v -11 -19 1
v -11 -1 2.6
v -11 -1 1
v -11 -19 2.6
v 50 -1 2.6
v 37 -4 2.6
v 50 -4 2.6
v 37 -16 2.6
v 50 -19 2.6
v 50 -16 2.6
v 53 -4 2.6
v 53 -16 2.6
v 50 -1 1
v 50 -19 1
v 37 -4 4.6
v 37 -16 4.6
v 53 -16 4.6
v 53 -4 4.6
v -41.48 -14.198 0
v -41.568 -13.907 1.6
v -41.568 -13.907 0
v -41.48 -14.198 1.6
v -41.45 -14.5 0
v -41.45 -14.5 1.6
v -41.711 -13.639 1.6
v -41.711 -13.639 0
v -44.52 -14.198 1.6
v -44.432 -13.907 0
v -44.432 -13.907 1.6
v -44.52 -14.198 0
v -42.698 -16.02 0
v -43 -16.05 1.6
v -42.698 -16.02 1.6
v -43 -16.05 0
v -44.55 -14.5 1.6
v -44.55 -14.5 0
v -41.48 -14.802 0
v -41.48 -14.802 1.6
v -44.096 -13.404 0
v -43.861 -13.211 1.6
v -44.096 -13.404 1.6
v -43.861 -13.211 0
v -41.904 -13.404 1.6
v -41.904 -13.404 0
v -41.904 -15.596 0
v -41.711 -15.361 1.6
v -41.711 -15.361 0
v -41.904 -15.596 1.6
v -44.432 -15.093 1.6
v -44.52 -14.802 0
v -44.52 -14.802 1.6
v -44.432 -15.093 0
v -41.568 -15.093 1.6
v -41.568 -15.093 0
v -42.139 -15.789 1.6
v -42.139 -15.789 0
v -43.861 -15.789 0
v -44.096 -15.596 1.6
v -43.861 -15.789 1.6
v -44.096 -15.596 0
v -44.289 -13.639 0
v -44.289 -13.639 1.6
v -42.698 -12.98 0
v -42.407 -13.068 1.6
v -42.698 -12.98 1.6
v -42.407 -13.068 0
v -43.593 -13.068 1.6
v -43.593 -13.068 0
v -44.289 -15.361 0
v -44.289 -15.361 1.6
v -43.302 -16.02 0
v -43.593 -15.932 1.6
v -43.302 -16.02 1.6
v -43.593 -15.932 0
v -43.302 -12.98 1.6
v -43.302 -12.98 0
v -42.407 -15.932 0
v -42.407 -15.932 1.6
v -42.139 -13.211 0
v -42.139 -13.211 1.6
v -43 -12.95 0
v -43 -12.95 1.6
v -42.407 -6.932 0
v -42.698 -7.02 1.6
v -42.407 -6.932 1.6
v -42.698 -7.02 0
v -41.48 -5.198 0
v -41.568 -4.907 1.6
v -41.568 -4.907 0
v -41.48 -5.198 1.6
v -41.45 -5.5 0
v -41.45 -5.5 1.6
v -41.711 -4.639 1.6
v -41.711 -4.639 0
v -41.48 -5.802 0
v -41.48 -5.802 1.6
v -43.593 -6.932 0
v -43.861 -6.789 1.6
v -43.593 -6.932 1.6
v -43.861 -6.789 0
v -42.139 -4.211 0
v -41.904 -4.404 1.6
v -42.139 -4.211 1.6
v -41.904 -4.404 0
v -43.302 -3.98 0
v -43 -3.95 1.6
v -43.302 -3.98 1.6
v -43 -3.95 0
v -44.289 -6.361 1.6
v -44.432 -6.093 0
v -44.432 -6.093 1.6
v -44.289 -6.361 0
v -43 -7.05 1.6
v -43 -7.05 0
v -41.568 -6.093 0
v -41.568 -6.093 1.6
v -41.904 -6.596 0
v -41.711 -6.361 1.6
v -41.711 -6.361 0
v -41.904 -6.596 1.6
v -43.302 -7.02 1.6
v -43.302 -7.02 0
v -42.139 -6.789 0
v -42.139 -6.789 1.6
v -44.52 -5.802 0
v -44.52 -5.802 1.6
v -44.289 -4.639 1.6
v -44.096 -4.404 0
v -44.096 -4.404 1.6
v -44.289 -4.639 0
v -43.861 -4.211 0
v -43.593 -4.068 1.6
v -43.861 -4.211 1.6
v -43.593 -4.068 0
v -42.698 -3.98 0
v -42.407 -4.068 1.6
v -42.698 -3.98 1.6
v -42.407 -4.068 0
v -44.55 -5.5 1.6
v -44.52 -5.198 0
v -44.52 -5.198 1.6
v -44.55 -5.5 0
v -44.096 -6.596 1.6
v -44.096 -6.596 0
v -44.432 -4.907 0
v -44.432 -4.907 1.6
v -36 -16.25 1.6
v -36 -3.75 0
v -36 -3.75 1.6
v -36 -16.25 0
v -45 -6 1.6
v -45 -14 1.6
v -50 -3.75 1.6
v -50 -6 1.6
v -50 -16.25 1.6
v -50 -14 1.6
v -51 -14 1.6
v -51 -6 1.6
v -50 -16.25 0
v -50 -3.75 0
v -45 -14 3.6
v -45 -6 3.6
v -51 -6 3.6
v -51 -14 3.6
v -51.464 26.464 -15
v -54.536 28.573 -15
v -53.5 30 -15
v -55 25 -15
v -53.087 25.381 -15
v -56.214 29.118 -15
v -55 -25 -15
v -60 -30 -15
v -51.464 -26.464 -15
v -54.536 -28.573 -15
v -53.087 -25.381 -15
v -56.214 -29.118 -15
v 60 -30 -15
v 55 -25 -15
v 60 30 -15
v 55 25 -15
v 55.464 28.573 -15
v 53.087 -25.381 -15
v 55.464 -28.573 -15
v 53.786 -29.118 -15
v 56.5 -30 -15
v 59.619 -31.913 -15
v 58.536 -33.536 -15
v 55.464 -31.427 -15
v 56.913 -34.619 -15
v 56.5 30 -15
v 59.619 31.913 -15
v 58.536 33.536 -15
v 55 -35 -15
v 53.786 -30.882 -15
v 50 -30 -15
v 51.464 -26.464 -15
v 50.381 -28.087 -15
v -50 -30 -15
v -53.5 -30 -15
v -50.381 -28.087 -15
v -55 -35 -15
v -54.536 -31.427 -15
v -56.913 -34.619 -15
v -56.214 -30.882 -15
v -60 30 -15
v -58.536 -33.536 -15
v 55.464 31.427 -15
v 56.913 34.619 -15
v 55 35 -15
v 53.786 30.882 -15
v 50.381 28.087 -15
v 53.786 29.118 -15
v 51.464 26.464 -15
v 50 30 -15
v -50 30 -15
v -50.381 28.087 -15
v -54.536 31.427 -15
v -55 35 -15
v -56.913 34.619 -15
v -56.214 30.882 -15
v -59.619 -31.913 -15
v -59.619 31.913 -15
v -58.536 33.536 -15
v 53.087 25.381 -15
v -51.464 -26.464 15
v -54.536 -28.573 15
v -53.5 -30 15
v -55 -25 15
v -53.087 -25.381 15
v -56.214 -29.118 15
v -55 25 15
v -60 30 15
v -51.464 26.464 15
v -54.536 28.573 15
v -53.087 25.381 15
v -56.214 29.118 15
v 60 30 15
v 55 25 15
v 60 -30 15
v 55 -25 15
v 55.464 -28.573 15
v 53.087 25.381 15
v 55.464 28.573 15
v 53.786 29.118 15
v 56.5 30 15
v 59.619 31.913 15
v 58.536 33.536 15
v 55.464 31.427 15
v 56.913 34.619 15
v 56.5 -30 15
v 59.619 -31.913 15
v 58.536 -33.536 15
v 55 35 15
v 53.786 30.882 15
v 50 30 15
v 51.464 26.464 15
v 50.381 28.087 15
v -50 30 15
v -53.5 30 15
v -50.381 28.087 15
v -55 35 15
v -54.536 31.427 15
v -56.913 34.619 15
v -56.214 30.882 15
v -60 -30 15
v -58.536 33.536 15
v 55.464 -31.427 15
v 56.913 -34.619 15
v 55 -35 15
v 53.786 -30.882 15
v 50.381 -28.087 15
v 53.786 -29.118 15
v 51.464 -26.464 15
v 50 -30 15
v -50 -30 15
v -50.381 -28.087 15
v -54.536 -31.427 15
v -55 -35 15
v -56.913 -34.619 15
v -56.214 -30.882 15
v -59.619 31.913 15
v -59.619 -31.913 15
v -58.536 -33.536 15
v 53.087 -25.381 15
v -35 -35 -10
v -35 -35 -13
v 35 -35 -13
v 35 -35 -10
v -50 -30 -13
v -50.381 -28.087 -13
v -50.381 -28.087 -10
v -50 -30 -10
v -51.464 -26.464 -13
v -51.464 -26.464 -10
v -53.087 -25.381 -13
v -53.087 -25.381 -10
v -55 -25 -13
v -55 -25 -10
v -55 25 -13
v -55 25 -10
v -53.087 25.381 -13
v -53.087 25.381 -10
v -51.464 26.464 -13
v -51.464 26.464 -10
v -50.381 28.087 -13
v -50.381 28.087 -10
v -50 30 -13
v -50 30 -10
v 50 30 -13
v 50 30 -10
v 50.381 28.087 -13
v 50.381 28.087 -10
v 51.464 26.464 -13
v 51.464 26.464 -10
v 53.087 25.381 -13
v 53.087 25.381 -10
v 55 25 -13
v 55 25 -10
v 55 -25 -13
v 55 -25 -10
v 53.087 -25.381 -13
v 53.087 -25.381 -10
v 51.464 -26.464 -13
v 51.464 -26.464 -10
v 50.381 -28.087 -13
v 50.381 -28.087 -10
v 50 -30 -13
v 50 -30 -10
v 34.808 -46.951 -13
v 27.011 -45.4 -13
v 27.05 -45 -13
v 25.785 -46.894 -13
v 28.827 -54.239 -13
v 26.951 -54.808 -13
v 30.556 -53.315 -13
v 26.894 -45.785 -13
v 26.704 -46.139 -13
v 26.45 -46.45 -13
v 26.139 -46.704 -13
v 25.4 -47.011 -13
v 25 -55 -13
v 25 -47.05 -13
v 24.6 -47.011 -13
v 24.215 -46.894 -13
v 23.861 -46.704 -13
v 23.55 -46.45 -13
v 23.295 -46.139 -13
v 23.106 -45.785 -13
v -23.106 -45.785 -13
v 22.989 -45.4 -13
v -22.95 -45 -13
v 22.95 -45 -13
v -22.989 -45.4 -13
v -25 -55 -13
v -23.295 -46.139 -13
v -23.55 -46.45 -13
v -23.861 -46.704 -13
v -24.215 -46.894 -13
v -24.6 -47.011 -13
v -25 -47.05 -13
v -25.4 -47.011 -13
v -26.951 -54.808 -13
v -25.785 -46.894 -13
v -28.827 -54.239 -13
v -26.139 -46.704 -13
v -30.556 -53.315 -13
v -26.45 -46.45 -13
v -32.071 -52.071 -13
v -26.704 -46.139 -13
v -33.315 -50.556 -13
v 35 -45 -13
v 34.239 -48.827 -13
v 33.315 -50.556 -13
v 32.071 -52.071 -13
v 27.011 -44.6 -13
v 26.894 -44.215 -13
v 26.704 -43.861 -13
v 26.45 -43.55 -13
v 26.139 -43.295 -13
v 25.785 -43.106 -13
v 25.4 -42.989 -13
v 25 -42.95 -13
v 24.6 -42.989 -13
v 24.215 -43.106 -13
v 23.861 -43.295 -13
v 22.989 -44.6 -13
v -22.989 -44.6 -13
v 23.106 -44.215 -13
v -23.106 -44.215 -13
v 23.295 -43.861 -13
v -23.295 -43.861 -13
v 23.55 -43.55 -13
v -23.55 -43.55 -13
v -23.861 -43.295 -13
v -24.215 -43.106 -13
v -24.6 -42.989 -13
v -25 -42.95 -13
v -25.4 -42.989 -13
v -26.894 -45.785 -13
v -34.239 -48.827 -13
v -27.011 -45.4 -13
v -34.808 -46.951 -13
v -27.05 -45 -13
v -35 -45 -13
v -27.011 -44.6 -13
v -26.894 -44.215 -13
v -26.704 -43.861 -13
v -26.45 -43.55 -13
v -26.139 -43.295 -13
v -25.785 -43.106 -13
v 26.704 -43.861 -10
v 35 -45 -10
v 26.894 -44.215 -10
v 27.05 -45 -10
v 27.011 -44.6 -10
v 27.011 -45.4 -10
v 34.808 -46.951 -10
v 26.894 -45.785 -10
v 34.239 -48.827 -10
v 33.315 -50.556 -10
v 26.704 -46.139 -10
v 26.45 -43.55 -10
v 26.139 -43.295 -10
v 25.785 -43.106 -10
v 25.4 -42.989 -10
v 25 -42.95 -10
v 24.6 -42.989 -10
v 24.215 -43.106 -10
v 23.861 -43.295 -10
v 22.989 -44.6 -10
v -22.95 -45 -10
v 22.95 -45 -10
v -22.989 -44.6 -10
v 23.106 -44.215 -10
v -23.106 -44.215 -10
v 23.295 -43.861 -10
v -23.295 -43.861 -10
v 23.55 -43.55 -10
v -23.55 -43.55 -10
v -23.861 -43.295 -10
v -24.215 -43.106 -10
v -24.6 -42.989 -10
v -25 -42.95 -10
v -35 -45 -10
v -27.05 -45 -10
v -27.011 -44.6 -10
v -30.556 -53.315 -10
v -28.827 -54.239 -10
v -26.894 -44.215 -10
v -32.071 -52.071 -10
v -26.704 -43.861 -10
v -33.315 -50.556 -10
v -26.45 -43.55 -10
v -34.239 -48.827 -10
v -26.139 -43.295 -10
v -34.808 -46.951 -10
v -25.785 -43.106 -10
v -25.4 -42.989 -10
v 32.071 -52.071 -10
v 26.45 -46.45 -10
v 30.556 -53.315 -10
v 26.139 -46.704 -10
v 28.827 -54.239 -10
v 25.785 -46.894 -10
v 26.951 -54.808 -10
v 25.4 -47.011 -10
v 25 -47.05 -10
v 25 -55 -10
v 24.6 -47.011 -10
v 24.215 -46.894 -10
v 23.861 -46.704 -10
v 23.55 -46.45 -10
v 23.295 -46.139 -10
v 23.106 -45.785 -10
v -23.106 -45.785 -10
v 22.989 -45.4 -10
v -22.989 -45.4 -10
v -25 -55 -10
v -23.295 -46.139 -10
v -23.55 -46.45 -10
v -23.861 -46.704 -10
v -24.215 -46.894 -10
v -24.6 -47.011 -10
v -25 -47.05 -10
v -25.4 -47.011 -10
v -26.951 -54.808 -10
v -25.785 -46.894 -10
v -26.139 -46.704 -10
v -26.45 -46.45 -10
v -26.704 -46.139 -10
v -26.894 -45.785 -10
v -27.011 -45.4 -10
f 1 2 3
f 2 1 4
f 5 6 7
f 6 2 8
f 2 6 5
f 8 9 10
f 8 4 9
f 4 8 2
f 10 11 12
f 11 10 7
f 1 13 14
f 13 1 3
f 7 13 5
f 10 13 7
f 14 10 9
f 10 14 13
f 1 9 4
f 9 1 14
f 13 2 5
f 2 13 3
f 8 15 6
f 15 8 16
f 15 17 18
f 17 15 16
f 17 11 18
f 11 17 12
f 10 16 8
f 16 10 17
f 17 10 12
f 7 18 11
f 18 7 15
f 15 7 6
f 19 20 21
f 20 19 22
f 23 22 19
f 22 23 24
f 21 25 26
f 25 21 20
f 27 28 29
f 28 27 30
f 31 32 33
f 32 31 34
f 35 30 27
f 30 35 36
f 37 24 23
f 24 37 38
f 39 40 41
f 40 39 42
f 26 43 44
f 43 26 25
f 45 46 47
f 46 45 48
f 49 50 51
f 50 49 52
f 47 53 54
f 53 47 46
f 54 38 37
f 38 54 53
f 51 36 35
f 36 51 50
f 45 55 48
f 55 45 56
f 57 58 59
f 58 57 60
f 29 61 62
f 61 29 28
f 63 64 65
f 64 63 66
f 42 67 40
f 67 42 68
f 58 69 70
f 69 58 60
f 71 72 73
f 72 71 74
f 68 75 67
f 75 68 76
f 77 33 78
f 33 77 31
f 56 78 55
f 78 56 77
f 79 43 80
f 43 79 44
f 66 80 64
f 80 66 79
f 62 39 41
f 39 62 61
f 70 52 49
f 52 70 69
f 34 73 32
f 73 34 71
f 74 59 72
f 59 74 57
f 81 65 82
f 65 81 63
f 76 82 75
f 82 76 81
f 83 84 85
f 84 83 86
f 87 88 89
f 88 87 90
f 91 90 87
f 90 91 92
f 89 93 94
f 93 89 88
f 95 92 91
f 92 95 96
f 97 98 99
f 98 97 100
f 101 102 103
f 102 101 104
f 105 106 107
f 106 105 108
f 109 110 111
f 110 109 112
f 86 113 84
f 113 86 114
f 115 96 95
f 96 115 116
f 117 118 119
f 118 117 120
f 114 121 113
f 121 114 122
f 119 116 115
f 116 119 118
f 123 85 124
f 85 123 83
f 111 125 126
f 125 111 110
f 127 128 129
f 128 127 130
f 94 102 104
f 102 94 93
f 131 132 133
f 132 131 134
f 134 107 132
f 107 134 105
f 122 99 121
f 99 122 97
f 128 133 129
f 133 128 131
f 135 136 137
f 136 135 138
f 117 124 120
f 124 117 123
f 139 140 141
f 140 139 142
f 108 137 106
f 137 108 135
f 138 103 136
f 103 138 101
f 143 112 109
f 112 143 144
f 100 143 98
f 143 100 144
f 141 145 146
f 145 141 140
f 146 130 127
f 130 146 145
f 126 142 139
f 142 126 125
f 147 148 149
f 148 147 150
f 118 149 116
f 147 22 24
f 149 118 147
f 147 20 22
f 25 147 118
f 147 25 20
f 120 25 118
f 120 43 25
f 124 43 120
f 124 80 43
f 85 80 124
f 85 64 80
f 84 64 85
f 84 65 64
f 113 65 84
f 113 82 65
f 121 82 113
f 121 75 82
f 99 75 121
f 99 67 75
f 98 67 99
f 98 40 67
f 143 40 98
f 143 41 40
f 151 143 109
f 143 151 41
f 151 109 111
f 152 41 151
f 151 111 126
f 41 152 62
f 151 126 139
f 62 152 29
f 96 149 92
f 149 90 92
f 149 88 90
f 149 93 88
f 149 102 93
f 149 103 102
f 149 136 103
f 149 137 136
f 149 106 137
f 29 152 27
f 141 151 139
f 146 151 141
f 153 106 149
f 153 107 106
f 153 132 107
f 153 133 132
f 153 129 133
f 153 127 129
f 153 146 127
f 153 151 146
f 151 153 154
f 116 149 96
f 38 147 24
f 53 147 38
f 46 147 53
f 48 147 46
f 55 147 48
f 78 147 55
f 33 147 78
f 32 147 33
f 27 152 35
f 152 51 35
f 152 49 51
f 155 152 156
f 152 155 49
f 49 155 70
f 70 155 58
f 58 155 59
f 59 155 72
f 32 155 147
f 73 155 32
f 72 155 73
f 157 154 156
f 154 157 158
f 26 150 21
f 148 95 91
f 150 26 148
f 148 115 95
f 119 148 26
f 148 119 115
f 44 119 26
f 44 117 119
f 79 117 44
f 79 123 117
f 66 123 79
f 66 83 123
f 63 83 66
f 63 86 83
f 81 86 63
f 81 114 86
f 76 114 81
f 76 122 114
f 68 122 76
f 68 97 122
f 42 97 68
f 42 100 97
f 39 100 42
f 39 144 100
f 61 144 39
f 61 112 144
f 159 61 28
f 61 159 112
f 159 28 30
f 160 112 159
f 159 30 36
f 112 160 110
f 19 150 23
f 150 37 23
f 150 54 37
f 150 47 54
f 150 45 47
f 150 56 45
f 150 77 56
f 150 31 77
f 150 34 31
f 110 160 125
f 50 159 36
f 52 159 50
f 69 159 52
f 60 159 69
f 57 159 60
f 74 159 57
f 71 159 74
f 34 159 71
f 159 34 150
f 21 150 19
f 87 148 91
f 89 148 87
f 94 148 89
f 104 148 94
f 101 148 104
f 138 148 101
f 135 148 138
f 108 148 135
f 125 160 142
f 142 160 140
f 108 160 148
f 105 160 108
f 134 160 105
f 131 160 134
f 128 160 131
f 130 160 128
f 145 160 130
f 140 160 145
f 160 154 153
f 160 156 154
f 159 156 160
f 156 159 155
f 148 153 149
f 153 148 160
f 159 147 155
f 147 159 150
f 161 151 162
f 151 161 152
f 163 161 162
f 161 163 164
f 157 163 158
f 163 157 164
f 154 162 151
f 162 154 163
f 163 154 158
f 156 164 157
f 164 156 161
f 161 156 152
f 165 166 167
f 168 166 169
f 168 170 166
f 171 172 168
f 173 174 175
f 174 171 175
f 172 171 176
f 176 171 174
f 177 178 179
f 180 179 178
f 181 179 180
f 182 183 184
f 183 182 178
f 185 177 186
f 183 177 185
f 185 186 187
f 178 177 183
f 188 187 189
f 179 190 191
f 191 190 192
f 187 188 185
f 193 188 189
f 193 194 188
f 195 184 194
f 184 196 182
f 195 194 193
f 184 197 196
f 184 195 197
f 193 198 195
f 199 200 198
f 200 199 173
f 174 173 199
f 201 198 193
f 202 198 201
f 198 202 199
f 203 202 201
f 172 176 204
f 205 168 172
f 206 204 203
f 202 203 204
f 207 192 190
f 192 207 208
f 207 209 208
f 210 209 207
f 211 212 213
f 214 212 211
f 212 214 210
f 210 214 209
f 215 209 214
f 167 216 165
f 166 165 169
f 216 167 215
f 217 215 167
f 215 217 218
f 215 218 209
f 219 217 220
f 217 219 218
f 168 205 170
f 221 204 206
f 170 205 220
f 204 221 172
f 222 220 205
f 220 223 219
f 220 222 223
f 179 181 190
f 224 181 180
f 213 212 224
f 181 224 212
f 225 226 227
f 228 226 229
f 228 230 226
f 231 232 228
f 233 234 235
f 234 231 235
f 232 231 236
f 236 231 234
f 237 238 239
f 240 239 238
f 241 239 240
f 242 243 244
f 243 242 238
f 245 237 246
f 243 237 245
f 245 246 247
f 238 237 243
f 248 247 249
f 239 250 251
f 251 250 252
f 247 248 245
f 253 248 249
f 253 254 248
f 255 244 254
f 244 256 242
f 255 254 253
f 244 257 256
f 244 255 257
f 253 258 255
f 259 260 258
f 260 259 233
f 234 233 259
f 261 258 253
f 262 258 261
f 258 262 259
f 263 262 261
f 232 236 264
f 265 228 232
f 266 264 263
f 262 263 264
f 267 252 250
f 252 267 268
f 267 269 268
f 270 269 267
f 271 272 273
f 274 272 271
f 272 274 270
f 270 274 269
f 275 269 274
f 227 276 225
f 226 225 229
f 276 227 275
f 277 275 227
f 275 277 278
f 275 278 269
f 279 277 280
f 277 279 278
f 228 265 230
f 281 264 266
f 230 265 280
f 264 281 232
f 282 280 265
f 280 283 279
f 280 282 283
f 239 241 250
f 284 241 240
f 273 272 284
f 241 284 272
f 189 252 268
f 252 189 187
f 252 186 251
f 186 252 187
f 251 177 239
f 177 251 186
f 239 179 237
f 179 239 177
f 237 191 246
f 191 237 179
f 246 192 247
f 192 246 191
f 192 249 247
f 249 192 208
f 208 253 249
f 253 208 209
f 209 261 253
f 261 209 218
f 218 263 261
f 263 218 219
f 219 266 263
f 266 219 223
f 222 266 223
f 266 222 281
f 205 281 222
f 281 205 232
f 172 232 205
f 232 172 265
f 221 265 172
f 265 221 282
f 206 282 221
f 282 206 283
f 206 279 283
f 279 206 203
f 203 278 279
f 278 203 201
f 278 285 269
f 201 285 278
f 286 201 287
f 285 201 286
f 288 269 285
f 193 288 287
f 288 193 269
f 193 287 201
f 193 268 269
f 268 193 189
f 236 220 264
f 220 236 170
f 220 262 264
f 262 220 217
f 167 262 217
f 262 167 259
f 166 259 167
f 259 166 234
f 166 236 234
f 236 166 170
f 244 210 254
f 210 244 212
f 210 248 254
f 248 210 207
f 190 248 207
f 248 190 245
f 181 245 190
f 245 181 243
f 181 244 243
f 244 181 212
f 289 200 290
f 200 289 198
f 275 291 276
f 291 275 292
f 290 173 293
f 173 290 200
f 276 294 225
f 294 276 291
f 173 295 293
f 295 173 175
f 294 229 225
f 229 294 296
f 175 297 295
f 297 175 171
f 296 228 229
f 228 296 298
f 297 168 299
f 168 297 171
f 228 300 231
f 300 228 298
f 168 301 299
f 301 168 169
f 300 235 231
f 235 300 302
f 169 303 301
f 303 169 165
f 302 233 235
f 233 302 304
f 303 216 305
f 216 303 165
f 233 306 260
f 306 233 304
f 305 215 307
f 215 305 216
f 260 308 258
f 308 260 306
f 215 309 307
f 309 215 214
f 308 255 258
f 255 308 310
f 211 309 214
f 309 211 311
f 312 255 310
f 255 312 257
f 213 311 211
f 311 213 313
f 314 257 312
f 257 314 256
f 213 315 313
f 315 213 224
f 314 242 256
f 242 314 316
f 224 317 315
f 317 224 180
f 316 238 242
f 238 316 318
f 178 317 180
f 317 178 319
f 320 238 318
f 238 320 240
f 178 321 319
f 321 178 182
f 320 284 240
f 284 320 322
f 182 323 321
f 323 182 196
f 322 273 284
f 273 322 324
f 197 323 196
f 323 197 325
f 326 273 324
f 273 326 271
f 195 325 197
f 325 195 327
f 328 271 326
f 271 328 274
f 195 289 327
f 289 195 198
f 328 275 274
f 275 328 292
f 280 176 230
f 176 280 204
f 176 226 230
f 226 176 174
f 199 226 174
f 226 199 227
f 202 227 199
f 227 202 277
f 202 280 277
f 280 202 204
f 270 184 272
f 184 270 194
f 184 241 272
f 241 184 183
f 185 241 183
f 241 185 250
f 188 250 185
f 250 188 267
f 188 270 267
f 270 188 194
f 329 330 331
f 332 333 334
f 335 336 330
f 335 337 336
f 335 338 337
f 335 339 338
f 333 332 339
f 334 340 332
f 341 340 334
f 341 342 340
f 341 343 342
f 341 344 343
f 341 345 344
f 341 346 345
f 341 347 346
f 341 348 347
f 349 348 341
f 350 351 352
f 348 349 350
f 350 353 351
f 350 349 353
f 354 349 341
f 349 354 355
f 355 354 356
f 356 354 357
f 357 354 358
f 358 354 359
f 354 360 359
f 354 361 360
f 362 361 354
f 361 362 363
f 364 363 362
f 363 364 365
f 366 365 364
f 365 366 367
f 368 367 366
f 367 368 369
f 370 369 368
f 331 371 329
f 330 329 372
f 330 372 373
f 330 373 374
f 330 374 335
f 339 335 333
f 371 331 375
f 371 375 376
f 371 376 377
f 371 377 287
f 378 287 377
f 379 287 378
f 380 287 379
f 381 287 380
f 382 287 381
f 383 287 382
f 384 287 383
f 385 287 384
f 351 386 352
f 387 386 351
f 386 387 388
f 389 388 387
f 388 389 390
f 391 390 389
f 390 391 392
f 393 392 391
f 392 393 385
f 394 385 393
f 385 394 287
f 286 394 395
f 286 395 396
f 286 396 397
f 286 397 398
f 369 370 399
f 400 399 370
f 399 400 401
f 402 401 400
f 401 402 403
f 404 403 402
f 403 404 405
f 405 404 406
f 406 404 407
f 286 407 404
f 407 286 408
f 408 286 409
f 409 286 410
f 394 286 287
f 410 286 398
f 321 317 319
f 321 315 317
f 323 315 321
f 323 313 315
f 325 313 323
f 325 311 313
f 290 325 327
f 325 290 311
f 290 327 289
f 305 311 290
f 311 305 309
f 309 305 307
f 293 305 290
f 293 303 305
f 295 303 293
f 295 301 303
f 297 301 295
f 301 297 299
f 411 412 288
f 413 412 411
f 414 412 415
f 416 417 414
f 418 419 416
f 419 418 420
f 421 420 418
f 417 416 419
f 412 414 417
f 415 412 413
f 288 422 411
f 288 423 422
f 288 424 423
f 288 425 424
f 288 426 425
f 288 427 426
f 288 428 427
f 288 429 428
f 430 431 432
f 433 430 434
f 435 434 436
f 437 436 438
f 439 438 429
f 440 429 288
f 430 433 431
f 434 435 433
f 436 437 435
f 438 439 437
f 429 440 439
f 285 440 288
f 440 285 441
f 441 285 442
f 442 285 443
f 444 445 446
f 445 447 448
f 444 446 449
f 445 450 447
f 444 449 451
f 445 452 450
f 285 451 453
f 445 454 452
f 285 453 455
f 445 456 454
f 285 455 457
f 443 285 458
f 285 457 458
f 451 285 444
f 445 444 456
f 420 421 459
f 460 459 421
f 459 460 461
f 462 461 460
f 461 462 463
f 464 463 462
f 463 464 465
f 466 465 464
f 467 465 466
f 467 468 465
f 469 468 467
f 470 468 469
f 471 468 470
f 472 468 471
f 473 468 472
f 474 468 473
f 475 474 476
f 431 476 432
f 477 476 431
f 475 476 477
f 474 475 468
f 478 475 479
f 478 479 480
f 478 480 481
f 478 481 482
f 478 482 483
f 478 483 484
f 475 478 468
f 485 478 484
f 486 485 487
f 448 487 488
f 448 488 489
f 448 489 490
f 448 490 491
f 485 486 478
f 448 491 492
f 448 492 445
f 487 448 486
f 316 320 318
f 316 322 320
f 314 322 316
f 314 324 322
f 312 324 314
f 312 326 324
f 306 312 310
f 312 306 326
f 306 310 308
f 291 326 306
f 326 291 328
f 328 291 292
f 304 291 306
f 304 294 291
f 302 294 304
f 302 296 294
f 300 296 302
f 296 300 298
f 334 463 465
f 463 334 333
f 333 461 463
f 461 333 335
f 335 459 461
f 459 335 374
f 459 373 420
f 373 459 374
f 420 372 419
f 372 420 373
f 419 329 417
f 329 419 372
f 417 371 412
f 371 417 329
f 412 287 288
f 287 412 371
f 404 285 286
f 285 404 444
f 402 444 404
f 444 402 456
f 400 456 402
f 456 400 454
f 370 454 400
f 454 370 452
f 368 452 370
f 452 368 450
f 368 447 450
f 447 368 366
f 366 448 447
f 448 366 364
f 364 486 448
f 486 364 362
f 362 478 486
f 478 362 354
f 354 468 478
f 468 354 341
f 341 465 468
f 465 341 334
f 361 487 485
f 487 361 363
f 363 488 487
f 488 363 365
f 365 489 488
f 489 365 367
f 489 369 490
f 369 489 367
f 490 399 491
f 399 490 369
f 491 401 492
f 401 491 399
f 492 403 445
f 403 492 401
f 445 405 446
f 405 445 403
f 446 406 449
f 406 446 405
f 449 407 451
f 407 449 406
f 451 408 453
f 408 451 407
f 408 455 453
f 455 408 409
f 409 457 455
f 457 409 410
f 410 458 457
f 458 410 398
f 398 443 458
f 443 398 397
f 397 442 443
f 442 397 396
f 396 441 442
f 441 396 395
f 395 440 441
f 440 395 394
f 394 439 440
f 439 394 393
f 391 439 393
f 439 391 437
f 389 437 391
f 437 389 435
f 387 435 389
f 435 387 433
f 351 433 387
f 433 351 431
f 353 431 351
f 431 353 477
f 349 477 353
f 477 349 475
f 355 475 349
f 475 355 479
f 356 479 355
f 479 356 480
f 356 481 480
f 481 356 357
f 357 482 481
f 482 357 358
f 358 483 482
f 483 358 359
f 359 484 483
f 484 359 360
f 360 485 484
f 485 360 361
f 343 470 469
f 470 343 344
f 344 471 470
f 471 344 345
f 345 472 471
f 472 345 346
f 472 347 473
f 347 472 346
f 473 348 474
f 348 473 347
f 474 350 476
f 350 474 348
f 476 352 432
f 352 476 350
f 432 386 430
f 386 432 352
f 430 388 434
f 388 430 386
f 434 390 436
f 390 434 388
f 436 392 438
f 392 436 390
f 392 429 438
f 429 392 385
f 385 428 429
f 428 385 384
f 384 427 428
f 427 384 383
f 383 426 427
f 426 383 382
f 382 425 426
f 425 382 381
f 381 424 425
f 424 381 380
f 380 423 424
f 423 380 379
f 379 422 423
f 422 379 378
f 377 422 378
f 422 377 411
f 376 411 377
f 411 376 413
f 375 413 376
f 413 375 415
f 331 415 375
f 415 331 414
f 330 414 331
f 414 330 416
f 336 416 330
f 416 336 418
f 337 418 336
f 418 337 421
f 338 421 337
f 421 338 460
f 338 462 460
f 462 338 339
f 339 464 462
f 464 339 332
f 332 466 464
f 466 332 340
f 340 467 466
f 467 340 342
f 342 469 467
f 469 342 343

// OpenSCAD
// file: common.scad
inner_size = [110, 60];
outer_size = inner_size + [10, 10];
centre_section_depth = 30;

corner_radius = 5;

sheet_thickness = 3;

magic_1 = outer_size - [2*corner_radius, 2*corner_radius];

teensy_position = [50, -10, 1];
usb_breakout_position = [-50, -10, 0];

module PlaceAtCentres(c)
{
  d = c / 2;
  for(x = [-d[0], d[0]])
  {
    for(y = [-d[1], d[1]])
    {
      translate([x, y])
      {
        children();
      }
    }
  }
}

module PanelProjectionOuter()
{
  minkowski()
  {
    square(magic_1, center=true);
    circle(r=corner_radius);
  }
}

module AssemblyHolesProjection(d)
{
  PlaceAtCentres(magic_1)
  {
    circle(d=d, $fn=32);
  }
}

module PanelProjection()
{

  difference()
  {
    PanelProjectionOuter();
    AssemblyHolesProjection(3.1);
  }
}
// file: parts/usb_breakout.scad
pcb_dimensions = [14, 12.5, 1.6];

usb_port_dimensions = [6, 8, 2];
usb_port_overhang = 1;

mounting_hole_diameter = 3.1;
mounting_hole_centres = 9;

module UsbBreakout()
{
  difference()
  {
    /* PCB */
    translate([0, -pcb_dimensions[1] / 2, 0])
    {
      color("green")
      {
        cube(pcb_dimensions);
      }
    }

    /* Mounting holes */
    for(y = [-mounting_hole_centres / 2, mounting_hole_centres / 2])
    {
      translate([pcb_dimensions[0] / 2, y, 0])
      {
        cylinder(d=mounting_hole_diameter, h=20, center=true, $fn=32);
      }
    }
  }

  /* USB port */
  translate([-usb_port_overhang, -usb_port_dimensions[1] / 2, pcb_dimensions[2]])
  {
    color("silver")
    {
      cube(usb_port_dimensions);
    }
  }
}

UsbBreakout();
// file: parts/teensy.scad
pcb_dimensions = [61, 18, 1.6];

sd_card_dimensions = [16, 12, 2];
sd_card_overhang = 3;

module Teensy35()
{
  /* PCB */
  translate([0, -pcb_dimensions[1] / 2, 0])
  {
    color("darkgreen")
    {
      cube(pcb_dimensions);
    }
  }

  /* SD card */
  translate([-sd_card_overhang, -sd_card_dimensions[1] / 2, pcb_dimensions[2]])
  {
    color("silver")
    {
      cube(sd_card_dimensions);
    }
  }
}

Teensy35();
// file: parts/rear_panel.scad
include <../common.scad>

module MountingTab(hole_diameter, hole_centres, outer_radius, lower_offset)
{
  dx = hole_centres / 2;
  magic_1 = 5;

  difference()
  {
    hull()
    {
      square([hole_centres + 2 * outer_radius, magic_1], center=true);

      for(x = [-dx, dx])
      {
        translate([x, magic_1-lower_offset])
        {
          circle(r=outer_radius, $fn=32);
        }
      }
    }

    for(x = [-dx, dx])
    {
      translate([x, magic_1-lower_offset])
      {
        circle(d=hole_diameter, $fn=32);
      }
    }
  }
}

module RearPanel()
{
  PanelProjection();

  translate([0, -outer_size[1] / 2])
  {
    MountingTab(hole_diameter=4.1, hole_centres=50, outer_radius=10, lower_offset=15);
  }
}

RearPanel();
// file: parts/front_panel.scad
include <../common.scad>

module DisplayMountingHoles()
{
  PlaceAtCentres([76, 44.5])
  {
    circle(d=3.2, $fn=32);
  }
}

module FrontPanel()
{
  difference()
  {
    PanelProjection();

    translate(display_offset)
    {
      DisplayMountingHoles();
    }
  }
}

FrontPanel();
// file: parts/enclosure.scad
include <../common.scad>

module Enclosure()
{
  linear_extrude(centre_section_depth, center=true)
  {
    difference()
    {
      union()
      {
        difference()
        {
          PanelProjectionOuter();
          square(inner_size, center=true);
        }

        /* Assembly screw hole support */
        PlaceAtCentres(magic_1)
        {
          circle(d=10);
        }
      }

      /* Assembly screw holes */
      PlaceAtCentres(magic_1)
      {
        circle(d=3);
      }
    }
  }
}

Enclosure();
// main file
use <parts/enclosure.scad>
use <parts/front_panel.scad>
use <parts/rear_panel.scad>
use <parts/teensy.scad>
use <parts/usb_breakout.scad>

include <common.scad>

module Extrude(c)
{
  color(c)
  {
    linear_extrude(sheet_thickness, center=true)
    {
      children();
    }
  }
}

module Assembly(explode)
{
  panel_distance = explode + (centre_section_depth + sheet_thickness) / 2;

  translate([0, 0, (centre_section_depth / 2) + panel_distance])
  {
    Extrude("red")
    {
      /* FrontPanel(); */
    }
  }

  Enclosure();

  translate(teensy_position)
  {
    rotate([0, 0, 180])
    {
      Teensy35();
    }
  }

  translate(usb_breakout_position)
  {
    UsbBreakout();
  }

  translate([0, 0, (centre_section_depth / 2) - panel_distance])
  {
    Extrude("blue")
    {
      RearPanel();
    }
  }
}

Assembly(explode=10);
